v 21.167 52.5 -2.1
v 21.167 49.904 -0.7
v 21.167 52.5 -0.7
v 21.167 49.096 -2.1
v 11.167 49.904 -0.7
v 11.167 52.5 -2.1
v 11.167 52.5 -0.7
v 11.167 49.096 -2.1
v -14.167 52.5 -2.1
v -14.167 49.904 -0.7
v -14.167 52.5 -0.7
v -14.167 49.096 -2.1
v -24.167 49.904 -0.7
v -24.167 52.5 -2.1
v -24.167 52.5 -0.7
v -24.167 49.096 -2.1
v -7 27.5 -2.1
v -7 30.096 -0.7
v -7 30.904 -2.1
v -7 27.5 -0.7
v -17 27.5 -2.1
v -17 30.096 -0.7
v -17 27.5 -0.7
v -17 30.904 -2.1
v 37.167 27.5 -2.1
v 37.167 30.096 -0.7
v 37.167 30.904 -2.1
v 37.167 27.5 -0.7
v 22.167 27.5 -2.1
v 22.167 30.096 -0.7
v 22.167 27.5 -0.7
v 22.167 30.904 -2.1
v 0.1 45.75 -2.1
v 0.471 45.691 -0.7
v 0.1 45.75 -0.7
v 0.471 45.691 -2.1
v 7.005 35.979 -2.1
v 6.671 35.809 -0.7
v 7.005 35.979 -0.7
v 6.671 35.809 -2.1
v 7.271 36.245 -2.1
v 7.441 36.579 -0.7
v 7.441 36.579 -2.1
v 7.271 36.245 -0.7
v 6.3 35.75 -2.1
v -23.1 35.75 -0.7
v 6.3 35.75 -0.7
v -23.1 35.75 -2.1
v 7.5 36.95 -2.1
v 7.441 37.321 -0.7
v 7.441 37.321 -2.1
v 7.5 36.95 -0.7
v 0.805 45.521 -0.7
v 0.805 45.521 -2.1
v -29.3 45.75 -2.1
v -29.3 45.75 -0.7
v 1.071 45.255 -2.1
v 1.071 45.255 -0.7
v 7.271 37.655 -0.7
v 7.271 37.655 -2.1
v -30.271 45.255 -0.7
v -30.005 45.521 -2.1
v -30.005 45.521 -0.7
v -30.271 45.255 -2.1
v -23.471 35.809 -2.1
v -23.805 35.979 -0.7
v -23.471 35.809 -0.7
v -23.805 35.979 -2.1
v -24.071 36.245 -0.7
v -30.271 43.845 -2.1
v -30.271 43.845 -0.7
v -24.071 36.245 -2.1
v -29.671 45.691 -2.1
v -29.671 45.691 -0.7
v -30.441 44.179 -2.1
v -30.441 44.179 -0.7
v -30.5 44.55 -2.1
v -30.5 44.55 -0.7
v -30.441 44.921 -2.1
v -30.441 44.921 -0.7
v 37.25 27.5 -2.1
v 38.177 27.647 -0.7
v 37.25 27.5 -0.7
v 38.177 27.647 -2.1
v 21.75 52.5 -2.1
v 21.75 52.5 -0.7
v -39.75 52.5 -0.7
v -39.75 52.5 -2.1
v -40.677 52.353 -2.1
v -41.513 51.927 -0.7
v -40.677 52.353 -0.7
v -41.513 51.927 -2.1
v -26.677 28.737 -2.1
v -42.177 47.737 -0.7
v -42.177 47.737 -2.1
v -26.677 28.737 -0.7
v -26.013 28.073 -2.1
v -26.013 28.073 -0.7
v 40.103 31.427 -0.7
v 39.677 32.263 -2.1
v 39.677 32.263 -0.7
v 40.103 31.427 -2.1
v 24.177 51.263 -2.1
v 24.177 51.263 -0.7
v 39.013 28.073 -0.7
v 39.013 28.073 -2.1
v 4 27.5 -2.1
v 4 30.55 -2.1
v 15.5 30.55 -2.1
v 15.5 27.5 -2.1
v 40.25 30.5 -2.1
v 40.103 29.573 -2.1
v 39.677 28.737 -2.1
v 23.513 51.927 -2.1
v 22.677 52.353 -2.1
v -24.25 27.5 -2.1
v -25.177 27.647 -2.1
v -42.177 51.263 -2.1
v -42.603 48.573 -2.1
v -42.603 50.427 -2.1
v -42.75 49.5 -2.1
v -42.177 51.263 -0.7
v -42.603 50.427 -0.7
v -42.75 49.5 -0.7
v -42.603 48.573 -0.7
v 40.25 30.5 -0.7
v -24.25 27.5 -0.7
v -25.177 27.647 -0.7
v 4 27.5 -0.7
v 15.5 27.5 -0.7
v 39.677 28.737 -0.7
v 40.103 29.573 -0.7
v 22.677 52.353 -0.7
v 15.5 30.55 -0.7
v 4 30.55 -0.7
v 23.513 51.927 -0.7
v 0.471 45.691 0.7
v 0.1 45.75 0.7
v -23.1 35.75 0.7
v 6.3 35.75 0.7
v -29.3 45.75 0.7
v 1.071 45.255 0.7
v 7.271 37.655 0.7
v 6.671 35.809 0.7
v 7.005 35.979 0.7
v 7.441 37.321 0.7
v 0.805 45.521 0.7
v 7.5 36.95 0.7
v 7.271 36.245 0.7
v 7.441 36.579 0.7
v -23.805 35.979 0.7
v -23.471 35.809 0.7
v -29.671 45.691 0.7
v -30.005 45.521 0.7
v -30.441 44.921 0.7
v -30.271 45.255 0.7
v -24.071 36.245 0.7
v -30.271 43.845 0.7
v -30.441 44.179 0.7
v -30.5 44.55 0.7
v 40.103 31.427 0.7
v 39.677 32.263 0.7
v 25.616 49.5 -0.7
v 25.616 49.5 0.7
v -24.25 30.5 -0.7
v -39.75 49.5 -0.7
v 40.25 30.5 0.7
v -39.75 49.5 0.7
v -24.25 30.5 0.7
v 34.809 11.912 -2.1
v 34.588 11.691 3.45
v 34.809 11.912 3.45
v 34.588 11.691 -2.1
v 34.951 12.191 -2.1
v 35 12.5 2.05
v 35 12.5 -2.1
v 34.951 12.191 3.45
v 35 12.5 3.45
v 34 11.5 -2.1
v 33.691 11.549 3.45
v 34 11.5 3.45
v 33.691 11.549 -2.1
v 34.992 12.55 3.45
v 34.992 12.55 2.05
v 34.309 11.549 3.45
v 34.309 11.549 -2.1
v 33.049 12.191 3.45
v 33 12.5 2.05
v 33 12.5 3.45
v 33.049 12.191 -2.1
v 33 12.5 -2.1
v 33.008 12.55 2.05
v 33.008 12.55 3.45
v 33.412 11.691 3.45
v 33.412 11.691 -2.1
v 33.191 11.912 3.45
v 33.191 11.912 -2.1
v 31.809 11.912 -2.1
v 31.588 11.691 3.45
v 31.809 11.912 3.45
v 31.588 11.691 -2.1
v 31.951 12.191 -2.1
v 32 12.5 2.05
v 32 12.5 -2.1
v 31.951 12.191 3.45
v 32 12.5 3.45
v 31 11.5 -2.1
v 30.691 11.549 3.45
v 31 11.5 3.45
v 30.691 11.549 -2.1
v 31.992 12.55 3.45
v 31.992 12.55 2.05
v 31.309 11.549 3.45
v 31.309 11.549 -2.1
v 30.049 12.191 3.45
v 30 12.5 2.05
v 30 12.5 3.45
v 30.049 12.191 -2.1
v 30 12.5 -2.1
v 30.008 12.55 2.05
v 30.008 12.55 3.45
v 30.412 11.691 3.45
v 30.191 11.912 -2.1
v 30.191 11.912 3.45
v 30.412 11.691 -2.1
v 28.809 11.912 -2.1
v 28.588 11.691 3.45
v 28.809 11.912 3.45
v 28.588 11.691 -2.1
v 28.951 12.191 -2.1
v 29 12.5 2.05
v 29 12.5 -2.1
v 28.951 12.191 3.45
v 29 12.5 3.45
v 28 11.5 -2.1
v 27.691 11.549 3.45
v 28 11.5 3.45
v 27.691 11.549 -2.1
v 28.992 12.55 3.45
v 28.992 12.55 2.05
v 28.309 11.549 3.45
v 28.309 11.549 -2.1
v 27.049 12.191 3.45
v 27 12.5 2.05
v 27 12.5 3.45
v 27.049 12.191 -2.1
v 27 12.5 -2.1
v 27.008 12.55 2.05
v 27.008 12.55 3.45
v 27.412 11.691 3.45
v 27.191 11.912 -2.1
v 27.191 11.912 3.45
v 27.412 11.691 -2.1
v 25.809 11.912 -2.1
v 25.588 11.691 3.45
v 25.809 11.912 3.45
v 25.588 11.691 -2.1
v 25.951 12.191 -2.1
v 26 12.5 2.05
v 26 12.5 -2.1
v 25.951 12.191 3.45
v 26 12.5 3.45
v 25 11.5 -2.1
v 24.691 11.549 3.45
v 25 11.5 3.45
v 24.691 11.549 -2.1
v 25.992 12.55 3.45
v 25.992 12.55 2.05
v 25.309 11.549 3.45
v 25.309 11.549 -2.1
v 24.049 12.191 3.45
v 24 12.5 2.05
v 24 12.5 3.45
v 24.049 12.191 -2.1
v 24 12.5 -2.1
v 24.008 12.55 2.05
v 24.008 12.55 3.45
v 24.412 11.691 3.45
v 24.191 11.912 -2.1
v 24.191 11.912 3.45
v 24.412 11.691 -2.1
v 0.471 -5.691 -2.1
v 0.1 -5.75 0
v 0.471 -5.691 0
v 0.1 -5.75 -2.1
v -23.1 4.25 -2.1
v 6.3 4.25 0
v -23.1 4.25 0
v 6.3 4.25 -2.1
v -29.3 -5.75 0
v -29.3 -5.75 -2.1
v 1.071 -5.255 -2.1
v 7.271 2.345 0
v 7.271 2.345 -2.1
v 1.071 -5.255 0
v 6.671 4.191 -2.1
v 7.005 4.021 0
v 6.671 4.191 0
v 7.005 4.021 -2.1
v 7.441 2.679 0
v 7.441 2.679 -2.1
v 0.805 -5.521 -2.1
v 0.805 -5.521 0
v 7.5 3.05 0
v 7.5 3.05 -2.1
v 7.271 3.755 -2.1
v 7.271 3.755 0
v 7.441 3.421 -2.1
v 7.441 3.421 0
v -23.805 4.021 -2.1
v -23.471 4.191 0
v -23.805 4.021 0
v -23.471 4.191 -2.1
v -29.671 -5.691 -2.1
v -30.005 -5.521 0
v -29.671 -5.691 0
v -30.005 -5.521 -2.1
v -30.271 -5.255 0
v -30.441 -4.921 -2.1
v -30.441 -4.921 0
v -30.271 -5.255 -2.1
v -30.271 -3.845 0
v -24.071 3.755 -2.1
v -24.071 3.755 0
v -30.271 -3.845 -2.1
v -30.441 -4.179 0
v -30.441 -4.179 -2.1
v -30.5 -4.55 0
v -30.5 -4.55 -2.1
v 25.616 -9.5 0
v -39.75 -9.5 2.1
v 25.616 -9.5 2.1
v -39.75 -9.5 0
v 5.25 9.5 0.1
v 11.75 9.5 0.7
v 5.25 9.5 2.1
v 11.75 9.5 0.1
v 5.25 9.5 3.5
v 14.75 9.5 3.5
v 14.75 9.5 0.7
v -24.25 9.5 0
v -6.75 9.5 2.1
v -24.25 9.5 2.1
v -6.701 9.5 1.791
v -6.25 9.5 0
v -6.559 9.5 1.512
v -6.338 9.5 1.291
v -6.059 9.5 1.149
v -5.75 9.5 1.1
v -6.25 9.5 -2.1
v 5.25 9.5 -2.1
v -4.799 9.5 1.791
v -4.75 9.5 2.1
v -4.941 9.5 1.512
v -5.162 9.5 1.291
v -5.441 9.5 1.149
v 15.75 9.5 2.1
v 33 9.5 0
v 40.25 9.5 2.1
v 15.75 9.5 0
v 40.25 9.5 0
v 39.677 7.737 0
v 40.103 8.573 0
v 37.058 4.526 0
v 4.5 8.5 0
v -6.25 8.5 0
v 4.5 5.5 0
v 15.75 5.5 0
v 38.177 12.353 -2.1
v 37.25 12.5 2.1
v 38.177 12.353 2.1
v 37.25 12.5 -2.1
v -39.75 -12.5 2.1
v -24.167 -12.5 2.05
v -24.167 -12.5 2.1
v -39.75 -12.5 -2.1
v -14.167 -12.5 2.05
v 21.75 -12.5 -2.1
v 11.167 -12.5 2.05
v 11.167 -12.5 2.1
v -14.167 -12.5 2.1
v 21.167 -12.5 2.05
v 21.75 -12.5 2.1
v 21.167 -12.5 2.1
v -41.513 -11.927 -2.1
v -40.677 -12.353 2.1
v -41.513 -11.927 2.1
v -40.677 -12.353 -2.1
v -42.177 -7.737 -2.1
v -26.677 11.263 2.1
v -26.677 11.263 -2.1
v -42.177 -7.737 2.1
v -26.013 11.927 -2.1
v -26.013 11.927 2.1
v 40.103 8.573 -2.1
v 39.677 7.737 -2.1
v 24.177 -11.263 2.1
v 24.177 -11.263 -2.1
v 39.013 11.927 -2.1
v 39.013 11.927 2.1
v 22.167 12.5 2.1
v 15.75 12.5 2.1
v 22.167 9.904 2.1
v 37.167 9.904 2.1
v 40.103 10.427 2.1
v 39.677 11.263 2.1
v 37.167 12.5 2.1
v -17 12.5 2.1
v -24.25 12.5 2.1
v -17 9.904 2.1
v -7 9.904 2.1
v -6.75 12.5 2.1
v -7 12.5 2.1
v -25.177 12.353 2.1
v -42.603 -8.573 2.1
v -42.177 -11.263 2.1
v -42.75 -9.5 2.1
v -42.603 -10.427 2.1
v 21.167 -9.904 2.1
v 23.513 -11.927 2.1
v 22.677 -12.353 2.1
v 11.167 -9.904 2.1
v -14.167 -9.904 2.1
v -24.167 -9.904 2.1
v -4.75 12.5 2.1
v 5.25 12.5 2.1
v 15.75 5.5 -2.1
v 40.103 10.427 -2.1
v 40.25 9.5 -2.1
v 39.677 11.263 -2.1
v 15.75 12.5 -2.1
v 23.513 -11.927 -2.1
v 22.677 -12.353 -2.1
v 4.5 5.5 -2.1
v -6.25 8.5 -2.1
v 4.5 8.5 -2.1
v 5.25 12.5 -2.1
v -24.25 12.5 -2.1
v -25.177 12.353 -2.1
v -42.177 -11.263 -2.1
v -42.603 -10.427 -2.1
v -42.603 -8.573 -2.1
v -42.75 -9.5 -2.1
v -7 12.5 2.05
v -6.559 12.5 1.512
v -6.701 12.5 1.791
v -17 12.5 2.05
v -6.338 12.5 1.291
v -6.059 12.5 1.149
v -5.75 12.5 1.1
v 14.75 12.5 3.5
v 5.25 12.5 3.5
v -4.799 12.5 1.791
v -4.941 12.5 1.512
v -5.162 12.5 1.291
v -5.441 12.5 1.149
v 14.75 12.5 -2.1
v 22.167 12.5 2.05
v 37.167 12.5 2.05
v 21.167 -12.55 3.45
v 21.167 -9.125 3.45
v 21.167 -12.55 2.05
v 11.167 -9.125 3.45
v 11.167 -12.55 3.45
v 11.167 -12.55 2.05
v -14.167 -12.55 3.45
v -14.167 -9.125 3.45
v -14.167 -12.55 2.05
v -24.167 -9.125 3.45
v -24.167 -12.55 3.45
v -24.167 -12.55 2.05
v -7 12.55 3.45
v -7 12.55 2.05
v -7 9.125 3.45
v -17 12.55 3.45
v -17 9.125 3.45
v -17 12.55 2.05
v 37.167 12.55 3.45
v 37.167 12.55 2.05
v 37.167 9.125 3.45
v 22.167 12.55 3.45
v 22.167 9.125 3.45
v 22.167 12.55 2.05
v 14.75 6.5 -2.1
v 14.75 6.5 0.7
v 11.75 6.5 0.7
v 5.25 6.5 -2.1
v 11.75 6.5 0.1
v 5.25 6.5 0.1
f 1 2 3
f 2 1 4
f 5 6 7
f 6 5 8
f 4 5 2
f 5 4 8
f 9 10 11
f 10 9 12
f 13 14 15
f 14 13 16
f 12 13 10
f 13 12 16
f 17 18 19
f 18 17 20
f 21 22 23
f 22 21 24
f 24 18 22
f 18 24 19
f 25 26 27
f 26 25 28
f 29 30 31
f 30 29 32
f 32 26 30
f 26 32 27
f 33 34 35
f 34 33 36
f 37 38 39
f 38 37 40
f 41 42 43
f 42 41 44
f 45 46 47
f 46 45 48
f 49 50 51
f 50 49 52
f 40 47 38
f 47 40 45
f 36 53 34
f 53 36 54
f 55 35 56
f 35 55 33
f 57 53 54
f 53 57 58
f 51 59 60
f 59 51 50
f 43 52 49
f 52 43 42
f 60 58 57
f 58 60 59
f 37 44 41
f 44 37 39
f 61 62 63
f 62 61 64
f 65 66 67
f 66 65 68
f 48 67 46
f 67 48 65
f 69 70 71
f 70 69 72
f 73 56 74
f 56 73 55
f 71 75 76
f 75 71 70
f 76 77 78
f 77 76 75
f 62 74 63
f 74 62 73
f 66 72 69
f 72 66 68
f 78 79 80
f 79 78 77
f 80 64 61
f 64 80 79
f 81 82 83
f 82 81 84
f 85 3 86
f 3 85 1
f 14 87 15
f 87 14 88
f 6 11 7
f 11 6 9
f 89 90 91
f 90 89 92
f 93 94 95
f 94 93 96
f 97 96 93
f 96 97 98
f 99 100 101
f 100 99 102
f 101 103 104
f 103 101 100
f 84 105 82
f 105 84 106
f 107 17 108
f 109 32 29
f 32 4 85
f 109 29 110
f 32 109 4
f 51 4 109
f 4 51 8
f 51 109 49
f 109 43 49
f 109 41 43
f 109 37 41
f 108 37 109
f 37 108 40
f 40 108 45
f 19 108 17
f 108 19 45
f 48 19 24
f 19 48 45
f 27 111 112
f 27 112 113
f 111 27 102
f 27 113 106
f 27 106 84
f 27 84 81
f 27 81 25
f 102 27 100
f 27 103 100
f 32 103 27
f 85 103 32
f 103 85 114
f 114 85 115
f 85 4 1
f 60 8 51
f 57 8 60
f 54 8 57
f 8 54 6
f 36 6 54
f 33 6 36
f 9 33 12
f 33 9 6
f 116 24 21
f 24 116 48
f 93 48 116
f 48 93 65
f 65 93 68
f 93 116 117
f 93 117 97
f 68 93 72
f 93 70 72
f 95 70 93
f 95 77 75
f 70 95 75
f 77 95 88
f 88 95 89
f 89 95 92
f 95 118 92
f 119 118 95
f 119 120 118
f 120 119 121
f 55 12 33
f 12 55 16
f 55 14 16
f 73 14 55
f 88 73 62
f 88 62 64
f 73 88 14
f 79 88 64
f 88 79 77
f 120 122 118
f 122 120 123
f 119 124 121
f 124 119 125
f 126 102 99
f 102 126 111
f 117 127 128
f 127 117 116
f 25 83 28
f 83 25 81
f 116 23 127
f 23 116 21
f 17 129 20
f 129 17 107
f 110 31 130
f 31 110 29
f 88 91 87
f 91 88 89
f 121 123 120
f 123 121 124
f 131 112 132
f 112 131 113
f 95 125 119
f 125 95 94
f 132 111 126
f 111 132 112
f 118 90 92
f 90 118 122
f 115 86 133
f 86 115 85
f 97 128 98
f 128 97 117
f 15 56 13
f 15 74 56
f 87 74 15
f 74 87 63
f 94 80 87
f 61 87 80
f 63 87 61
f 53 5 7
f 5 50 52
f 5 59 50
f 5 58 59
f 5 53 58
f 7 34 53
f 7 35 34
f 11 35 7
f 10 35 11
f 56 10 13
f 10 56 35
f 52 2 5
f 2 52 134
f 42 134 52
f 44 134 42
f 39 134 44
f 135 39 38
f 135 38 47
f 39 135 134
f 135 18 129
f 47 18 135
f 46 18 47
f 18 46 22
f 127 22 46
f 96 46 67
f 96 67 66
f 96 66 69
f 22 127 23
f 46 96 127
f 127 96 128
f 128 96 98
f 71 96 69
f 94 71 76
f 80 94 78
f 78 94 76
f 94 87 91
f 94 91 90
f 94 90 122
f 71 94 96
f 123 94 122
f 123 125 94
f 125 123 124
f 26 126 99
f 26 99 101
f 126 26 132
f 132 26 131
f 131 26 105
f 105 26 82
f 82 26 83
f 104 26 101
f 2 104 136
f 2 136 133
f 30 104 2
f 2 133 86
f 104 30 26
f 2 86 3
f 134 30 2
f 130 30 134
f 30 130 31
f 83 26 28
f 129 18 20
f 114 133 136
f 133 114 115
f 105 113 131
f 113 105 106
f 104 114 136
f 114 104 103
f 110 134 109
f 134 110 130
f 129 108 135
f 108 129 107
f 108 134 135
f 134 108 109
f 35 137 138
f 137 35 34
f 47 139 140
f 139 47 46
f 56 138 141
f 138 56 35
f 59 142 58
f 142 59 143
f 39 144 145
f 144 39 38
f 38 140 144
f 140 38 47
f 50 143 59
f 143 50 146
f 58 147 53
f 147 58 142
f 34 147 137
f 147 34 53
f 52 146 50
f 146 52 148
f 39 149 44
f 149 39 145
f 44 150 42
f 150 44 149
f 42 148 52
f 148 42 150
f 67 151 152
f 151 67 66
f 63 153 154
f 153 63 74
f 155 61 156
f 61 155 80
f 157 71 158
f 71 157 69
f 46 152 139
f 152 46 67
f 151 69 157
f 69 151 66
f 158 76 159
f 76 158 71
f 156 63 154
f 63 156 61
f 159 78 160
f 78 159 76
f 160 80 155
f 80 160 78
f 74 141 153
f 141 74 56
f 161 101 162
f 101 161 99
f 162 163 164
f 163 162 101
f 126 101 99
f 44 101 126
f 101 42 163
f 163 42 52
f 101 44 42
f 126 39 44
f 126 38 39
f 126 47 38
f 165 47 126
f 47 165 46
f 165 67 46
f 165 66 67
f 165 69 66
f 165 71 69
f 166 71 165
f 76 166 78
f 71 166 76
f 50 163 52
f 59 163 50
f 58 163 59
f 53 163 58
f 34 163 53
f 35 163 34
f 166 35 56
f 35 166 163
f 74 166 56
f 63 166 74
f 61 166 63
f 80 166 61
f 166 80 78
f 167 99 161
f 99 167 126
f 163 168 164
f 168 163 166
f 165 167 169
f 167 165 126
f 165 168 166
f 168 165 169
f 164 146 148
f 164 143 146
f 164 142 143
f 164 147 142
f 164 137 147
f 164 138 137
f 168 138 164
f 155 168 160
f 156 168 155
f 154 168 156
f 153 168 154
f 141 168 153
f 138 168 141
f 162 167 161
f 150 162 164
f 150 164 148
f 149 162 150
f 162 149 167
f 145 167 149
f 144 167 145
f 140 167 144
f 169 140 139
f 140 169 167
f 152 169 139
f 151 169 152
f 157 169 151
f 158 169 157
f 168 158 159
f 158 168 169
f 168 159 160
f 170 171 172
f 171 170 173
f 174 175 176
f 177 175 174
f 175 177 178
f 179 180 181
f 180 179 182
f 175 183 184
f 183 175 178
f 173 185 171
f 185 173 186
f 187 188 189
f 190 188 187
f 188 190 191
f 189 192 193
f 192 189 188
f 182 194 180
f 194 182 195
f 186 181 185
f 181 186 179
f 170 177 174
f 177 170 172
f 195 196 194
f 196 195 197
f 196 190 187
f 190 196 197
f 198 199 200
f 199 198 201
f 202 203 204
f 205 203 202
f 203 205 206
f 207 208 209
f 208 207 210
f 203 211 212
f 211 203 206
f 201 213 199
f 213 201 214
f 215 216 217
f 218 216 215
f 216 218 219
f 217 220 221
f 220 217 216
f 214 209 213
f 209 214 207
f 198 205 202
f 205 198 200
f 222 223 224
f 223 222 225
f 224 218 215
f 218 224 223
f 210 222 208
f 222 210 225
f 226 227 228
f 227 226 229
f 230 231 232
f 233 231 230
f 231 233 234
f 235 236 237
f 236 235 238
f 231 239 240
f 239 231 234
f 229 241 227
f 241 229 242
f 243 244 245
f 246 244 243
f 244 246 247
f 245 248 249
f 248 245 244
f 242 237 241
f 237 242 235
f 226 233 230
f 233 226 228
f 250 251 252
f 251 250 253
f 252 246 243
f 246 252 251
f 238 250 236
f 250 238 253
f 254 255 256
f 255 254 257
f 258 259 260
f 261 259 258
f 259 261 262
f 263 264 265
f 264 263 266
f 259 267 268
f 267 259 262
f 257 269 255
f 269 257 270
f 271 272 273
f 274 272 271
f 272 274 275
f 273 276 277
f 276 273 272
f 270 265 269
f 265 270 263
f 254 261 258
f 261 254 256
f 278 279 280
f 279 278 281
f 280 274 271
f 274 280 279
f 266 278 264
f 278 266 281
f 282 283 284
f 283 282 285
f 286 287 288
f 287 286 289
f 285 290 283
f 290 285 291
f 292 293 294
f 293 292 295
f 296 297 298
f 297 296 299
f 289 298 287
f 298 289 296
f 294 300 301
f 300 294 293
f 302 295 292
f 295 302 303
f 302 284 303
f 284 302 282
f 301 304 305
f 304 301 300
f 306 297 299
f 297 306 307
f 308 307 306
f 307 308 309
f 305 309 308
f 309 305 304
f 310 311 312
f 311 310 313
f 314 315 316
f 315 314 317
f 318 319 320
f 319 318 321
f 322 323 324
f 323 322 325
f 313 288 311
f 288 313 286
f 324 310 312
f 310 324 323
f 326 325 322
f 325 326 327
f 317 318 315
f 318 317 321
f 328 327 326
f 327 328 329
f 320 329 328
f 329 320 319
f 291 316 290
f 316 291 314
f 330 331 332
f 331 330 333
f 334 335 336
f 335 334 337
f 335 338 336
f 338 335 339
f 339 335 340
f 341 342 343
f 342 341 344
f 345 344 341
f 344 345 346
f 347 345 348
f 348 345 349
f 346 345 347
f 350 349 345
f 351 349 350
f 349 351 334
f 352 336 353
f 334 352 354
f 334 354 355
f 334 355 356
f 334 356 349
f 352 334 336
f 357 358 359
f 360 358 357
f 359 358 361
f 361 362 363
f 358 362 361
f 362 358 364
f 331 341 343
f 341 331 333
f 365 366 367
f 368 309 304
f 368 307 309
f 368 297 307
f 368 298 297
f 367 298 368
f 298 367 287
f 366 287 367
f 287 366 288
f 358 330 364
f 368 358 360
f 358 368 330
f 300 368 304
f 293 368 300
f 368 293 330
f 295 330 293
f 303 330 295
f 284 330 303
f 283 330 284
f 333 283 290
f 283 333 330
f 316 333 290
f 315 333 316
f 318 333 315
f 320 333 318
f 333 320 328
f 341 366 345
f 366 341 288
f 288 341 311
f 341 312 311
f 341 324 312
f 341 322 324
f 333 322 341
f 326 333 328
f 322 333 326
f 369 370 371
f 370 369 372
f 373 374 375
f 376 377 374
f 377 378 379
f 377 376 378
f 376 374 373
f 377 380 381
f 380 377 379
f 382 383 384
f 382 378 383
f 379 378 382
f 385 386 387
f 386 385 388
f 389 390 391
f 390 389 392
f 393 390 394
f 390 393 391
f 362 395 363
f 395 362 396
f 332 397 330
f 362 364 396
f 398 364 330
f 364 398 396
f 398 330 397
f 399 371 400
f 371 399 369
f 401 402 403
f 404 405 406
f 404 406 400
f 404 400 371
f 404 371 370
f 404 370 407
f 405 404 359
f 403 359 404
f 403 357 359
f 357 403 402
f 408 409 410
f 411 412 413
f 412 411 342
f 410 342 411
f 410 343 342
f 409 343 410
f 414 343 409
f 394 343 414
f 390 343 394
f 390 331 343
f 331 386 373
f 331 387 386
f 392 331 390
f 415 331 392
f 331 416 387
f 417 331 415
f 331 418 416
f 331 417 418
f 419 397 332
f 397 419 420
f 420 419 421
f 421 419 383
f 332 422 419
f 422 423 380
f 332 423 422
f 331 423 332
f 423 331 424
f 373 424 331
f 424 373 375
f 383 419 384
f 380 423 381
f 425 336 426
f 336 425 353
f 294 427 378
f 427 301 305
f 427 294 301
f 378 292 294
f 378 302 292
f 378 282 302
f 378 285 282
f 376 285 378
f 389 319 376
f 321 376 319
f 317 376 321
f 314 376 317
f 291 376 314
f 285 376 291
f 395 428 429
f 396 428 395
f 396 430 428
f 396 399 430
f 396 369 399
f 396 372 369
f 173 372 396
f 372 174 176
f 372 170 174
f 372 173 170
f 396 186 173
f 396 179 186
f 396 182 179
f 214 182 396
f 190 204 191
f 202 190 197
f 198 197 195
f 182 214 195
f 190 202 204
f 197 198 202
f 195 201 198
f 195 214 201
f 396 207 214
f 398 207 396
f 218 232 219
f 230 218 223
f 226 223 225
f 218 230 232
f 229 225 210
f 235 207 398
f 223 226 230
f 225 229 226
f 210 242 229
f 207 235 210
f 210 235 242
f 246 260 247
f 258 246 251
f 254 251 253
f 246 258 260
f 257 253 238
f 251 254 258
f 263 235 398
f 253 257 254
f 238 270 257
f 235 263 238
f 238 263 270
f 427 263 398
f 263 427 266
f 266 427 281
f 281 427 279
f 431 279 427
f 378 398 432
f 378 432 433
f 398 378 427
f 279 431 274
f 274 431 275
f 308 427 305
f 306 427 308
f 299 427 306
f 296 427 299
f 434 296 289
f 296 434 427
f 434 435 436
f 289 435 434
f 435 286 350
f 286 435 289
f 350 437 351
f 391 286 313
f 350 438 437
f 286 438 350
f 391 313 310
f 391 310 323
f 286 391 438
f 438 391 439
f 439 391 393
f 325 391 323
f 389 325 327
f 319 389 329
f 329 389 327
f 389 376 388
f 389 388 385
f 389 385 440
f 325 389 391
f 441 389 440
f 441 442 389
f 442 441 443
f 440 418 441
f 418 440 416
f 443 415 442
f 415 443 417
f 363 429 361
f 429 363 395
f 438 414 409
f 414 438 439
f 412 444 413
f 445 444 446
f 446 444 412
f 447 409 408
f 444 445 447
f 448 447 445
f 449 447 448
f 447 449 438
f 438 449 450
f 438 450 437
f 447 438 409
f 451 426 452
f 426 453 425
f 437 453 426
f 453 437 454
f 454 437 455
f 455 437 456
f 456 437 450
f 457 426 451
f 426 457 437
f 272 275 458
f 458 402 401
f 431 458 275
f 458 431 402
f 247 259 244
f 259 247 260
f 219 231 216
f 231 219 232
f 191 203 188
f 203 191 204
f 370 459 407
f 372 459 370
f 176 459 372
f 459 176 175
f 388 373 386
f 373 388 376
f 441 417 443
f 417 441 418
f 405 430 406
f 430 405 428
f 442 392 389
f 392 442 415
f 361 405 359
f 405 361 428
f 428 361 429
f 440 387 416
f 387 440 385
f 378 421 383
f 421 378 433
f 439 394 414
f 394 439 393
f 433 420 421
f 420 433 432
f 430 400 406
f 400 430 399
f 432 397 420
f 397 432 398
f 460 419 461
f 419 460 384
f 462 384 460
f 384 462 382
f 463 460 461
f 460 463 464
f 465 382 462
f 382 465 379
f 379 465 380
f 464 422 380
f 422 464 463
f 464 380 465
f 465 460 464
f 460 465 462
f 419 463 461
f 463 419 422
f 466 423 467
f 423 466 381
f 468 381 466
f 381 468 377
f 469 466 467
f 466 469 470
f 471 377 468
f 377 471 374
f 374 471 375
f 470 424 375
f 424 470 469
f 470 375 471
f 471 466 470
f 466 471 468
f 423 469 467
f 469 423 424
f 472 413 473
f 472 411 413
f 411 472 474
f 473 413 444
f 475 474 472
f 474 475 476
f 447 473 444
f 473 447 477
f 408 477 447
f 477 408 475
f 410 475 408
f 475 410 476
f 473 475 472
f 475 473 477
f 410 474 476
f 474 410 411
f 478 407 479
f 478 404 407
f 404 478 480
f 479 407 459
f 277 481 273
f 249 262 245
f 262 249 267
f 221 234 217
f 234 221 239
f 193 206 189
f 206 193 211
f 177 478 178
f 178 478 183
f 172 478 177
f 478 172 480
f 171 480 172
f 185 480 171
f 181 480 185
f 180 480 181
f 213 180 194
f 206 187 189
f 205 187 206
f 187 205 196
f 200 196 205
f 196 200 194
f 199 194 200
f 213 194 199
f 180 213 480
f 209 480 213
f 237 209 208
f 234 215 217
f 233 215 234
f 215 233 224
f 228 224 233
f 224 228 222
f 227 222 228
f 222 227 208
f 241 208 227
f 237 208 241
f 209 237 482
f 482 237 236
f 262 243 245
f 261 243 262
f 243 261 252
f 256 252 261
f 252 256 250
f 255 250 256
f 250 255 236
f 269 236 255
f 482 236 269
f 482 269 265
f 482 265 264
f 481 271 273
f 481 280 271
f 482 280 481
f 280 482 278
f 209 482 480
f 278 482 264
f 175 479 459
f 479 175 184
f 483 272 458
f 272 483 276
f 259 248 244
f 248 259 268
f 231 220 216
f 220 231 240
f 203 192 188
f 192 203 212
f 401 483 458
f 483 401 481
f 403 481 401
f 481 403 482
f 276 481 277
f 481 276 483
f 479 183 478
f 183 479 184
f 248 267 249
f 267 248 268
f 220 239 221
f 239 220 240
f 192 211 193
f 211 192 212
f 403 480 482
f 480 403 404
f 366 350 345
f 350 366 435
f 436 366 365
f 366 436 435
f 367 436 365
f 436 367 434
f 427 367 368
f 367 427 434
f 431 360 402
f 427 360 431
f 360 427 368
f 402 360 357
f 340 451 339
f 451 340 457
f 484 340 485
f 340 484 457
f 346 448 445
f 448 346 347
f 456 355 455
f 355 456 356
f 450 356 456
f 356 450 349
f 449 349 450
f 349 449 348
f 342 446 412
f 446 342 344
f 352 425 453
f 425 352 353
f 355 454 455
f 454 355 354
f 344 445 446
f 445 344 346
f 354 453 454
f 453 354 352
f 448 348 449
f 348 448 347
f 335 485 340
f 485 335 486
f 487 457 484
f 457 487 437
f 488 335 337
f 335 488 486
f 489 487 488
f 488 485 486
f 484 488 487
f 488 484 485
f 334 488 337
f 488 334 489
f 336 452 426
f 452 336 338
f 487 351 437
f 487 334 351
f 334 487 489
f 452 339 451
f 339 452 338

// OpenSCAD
//Yet another utility blade holder (YAUBH)
//by Khairulmizam Samsudin, Sept 2016
//xource@gmail.com
//"yaubh" is licenced under Creative Commons :
//Attribution-NonCommercial-ShareAlike 4.0 International (CC BY-NC-SA 4.0)
//http://creativecommons.org/licenses/by-nc-sa/4.0/

//UPDATES:
//05/09/2016 - Released

/* [Options] */
// preview[view:south, tilt:top]
// Blade thickness. Adjust to obtain smooth deployment of blade
Blade_thickness = 0.6; // [0.4:1.2]
// Tolerance for blade width. Adjust to reduce cutout width and obtain snug fit
Blade_width_tolerance = 1; // [0:5]
// Option for left handed user
Left_handed_user = 0; // [0:No,1:Yes]


/* [Hidden] */
bladeT=Blade_thickness;
left=Left_handed_user;

epsilon=0.1;
holderT=bladeT+5;
//blade
bL1=33;
bL2=64;
bW=20-Blade_width_tolerance;
notchL=3;
notchW=3;
tabL=3.5;

diff=(bL2-bL1)/2;
holderL1=bL1+diff;
holderL2=bL2+diff;
hnotchX=holderL1/2-diff+notchL/2+notchL;
hedgeR=3;//5;//4; - remove pin
hpinD=2.5;//2; //1.75mm filament
hpinR=hpinD/2;
hdepth=holderT/4; //frame cutout depth
hbottomT=holderT/2+hdepth;
htopT=holderT-hbottomT;
bopenX=tabL/2+notchL/2+hnotchX;
bcloseX=-diff/2;
bZ=hbottomT/2-bladeT/2-hdepth;
//frame cut
fcW=1;
fcL=18; //fixme. need to minus -notchL-tabL
//holder clip
hclipL=10;
hclipW=hedgeR;
hclipT=htopT;
hclipRotX=30;//20;
hclipY1=-bW/2;
hclipX1=holderL1/3;
hclipX2=-hclipX1-hedgeR;
hclipX3=-fcL/1.5;
hclipX4=+hclipX1+diff-hedgeR/1.5;
//jimping
jcR=1;
jcH=10;
jcY=bW/2+hedgeR;
jcX1=bL1+jcR*1;            
jcX2=bL1-jcR*2;            
jcX3=bL1-jcR*2-jcR*3;            
jcX4=bL1-jcR*2-jcR*3-jcR*3;            

module trapezoid(L1,L2,W,T,type=1,R=0) {
    //used for blade
    if (type==1) {
        p=[[L2/2,-W/2],[-L2/2,-W/2],[-L1/2,W/2],[L1/2,W/2]];
        translate([0,0,-T/2]) linear_extrude(height=T) polygon(p);
    //used for holder
    } else if (type==2) {
        cover_tip=13;
        p=[[L1/2-diff+cover_tip,-W/2],[-L2/2,-W/2],[-L1/2,W/2],[L1/2+cover_tip,W/2]];
        if (R !=0) {    
        hull() {
                for (loc = [0:3]) {
                    translate([p[loc][0],p[loc][1],-T/2]) cylinder(r=R,h=T,$fn=20);
                }
            }
            //loca=0;
            //translate([p[loca][0],p[loca][1],-T/2]) #cylinder(r=R,h=T*2,$fn=20);
        } else {
            translate([0,0,-T/2]) linear_extrude(height=T) polygon(p);
        }
    }
}

module blade(T=bladeT,notch=0) {
    difference() {
        trapezoid(bL1,bL2,bW,T);
        //notch
        if (notch) {
            translate([notchL/2+tabL/2,bW/2-notchW/2,0]) cube([notchL,notchW+epsilon,T+epsilon],center=true);
            translate([-notchL/2-tabL/2,bW/2-notchW/2,0]) cube([notchL,notchW+epsilon,T+epsilon],center=true);
        }
    }
}


module handlec(T,e=0) {
    translate ([-bL1/6,-notchW/4,0]) scale([0.4,0.4,1]) trapezoid(bL1,bL2,bW-e,T+epsilon,type=2,R=hedgeR-e);
    translate ([-bL1/2,-notchW/4,0]) scale([0.4,0.4,1]) trapezoid(bL1,bL2,bW-e,T+epsilon,type=2,R=hedgeR-e);
}


module jimpc() {
    translate([jcX1,jcY,0]) rotate([0,0,90]) cylinder(r=jcR,h=jcH,$fn=20,center=true);
    translate([jcX2,jcY,0]) rotate([0,0,90]) cylinder(r=jcR,h=jcH,$fn=20,center=true);
    translate([jcX3,jcY,0]) rotate([0,0,90]) cylinder(r=jcR,h=jcH,$fn=20,center=true);
    translate([jcX4,jcY,0]) rotate([0,0,90]) cylinder(r=jcR,h=jcH,$fn=20,center=true);
}
//holder clip
module clip(L=hclipL,e=0) {
    difference() {
        translate([-L/2,-hclipW-epsilon/2,-hclipT/2-epsilon/2]) cube([L,hclipW*2,hclipT+e]);
        rotate([-hclipRotX,0,0]) translate([-L/2-epsilon/2,0,-hclipT]) cube([L+epsilon,hclipW*2,hclipT*3]);  
    }
}

module hclip(Z=0,e=0) {
    translate([hclipX1,hclipY1,Z]) clip(e=e);
    translate([hclipX2,hclipY1,Z]) clip(e=e);
    mirror([0,1,0]) translate([hclipX3,hclipY1,Z]) clip(e=e);
    mirror([0,1,0]) translate([hclipX4,hclipY1,Z]) clip(L=hclipL*1.5, e=e);
}

module holder(T=holderT/2,e=0,jimping=1,clip=0) {
    difference() {
        //trapezoid(holderL1,holderL2,bW,bladeT,type=2);
        trapezoid(holderL1,holderL2,bW,T,type=2,R=hedgeR+e);
        //holder clip cutout
        if (clip==2) {hclip(Z=0,e=epsilon); }
    
        //handle cutout
        handlec(T,e=e);
    
        //jimping
        if (jimping) jimpc();
    }
    //holder clip
    if (clip==1) {
        difference() {    
            hclipZ=hbottomT/2+htopT/2;
            hclip(Z=hclipZ);
            //jimping
            jimpc();
        }
    }
}

module bhframe(opennotch=1,bladecut=1,e=0,jimping=1,clip=0) {
    difference() {
        holder(T=hbottomT+e,e=e,jimping=jimping,clip=clip);
        //blade cutout
        bcT=bladeT+hdepth+epsilon;
        bcZ=hbottomT/2-bcT/2+epsilon/2;
        if (bladecut) {
            //blade close and open position
            translate([bcloseX,0,bcZ]) blade(notch=0,T=bcT+epsilon);
            translate([bopenX,0,bcZ]) blade(notch=0,T=bcT+epsilon);
            //blade access
            translate([bopenX+bL1,0,bcZ]) blade(notch=1,T=bcT+epsilon);
        }
     
    }
}
//bottom holder - additional hdepth recessed
module bholder() {
    difference() {
        bhframe(clip=1);

        //frame cut
        translate([hnotchX,bW/2-notchW/2,holderT/2-hbottomT/2]) union() {
            translate([-fcL/2-notchL/2,-fcW/2+notchW/2,0]) cube([fcL,fcW,10],center=true); 
            //two catch
            //c1L=notchL*2+tabL+fcW*2;
            //only catch1 i.e. one notch
            c1L=notchL+fcW;            
            c1W=notchW+fcW;
            //two catch
            //c1X=c1L/2-notchL/2-fcW;
            c1X=c1L/2-notchL-tabL+fcW;
            c1Y=-fcW/2;
            //only catch2 i.e. one notch
            c3L=notchL+tabL;
            c3W=notchW;
            c3X=c1X-c1L/2-c3L/2+notchW+tabL;
            c3Y=-c3W/2+fcW/2;
            difference() {
                //catch1 plate
                // translate([c1X,c1Y,0]) cube([c1L,c1W,10],center=true);
                //longer plate
                translate([c1X,c1Y,0]) cube([c1L+notchL+tabL,c1W,10],center=true);
            //    translate([c3X,c3Y,0]) cube([c3L,c3W,11], center=true);
            }
            
            c2W=notchW+hedgeR+fcW+epsilon;
            c2L=fcW;
            c2X=-c2L/2+c1L/2+c1L/2-notchL/2;
            c2Y=c2W/2+c1Y-c1W/2;
            translate([c2X,c2Y,0]) cube([c2L,c2W,10], center=true);
        }
        //frame lock stress reliever
        hsrR=1;
        hsrY=bW/2+hedgeR/2;
        hsrX=hnotchX-fcL-hsrR;    
        hsrZ=hbottomT/2;
        translate([hsrX,hsrY,hsrZ]) rotate([90,0,0]) cylinder(r=hsrR,h=10,center=true,$fn=20);
            
    }
    //catch
    translate([hnotchX,bW/2-notchW/2,-hdepth/2]) union() { 
        //catch1
        cube([notchL,notchW,hbottomT-hdepth],center=true);
        //catch2
        //translate([tabL+notchL,0,0]) cube([notchL,notchW,hbottomT-hdepth],center=true);
            
        //bottom index finger plate
        tpL=tabL+notchL*2;
        translate([-tabL/2-notchL/2,0,-bladeT/2]) cube([tpL,notchW,hbottomT-hdepth-bladeT],center=true);
        //top index finger plate
        tpL=tabL+notchL*2;
        translate([-tabL/2-notchL/2,notchW/2+hedgeR/2,holderT/2-(hbottomT-hdepth)/2]) difference() {
            cube([tpL,hedgeR,holderT],center=true);
            //translate([0,0,hedgeR/2]) rotate([90,0,0]) cylinder(r=1,h=hedgeR*2,$fn=20,center=true);
            //translate([tpL/2,0,hedgeR/2]) rotate([90,0,0]) cylinder(r=1,h=hedgeR*2,$fn=20,center=true);
            //translate([-tpL/2,0,hedgeR/2]) rotate([90,0,0]) cylinder(r=1,h=hedgeR*2,$fn=20,center=true);
        }
    }
    
    
}
module bg() {
    difference() {
        bhframe(opennotch=0,bladecut=0);
        bhframe(opennotch=0,bladecut=1,e=epsilon);
    }
}


//top holder - additional hdepth raised
module tholder() {
    difference() {
        holder(T=htopT,clip=2);
        //index finger plate cut
        c1L=notchL*2+tabL+fcW*2;
        translate([notchL+tabL-fcW,bW/2-notchW/2,holderT/2-hbottomT/2])
        translate([c1L/2-notchL/2,hedgeR/2+notchW/2,0]) cube([c1L,hedgeR+epsilon,10],center=true);
        
    }
    
    
    
    //blade clamp
    bgT=hdepth;
    bgZ=-bgT/2-bgT;
    translate([0,0,-htopT/2]) difference() {
        translate([0,0,-hbottomT/2]) bhframe(opennotch=0,bladecut=0,jimping=0);
        translate([0,0,-hbottomT/2]) bhframe(opennotch=0,bladecut=1,e=epsilon,jimping=0);
        translate([0,0,bgZ]) cube([bL2*2,bL2,bgT],center=true);
    }    
}

debug=0;
if (debug) {
        tholder();
        translate([0,0,-10]) bholder();
} else {
    tholderZ = (left==0) ? htopT/2-hbottomT/2 : -htopT/2+hbottomT/2;
    rotX = (left==0) ? 0 : 180;
    rotate ([rotX,0,0]) {
        translate([0,40,tholderZ]) mirror([0,0,left]) rotate([180,0,0]) tholder();
        translate([0,0,0]) mirror([0,0,left]) bholder();
    //translate([bcloseX,0,bZ]) %blade(notch=1);
    translate([bopenX,0,bZ]) %blade(notch=1);
}
}
